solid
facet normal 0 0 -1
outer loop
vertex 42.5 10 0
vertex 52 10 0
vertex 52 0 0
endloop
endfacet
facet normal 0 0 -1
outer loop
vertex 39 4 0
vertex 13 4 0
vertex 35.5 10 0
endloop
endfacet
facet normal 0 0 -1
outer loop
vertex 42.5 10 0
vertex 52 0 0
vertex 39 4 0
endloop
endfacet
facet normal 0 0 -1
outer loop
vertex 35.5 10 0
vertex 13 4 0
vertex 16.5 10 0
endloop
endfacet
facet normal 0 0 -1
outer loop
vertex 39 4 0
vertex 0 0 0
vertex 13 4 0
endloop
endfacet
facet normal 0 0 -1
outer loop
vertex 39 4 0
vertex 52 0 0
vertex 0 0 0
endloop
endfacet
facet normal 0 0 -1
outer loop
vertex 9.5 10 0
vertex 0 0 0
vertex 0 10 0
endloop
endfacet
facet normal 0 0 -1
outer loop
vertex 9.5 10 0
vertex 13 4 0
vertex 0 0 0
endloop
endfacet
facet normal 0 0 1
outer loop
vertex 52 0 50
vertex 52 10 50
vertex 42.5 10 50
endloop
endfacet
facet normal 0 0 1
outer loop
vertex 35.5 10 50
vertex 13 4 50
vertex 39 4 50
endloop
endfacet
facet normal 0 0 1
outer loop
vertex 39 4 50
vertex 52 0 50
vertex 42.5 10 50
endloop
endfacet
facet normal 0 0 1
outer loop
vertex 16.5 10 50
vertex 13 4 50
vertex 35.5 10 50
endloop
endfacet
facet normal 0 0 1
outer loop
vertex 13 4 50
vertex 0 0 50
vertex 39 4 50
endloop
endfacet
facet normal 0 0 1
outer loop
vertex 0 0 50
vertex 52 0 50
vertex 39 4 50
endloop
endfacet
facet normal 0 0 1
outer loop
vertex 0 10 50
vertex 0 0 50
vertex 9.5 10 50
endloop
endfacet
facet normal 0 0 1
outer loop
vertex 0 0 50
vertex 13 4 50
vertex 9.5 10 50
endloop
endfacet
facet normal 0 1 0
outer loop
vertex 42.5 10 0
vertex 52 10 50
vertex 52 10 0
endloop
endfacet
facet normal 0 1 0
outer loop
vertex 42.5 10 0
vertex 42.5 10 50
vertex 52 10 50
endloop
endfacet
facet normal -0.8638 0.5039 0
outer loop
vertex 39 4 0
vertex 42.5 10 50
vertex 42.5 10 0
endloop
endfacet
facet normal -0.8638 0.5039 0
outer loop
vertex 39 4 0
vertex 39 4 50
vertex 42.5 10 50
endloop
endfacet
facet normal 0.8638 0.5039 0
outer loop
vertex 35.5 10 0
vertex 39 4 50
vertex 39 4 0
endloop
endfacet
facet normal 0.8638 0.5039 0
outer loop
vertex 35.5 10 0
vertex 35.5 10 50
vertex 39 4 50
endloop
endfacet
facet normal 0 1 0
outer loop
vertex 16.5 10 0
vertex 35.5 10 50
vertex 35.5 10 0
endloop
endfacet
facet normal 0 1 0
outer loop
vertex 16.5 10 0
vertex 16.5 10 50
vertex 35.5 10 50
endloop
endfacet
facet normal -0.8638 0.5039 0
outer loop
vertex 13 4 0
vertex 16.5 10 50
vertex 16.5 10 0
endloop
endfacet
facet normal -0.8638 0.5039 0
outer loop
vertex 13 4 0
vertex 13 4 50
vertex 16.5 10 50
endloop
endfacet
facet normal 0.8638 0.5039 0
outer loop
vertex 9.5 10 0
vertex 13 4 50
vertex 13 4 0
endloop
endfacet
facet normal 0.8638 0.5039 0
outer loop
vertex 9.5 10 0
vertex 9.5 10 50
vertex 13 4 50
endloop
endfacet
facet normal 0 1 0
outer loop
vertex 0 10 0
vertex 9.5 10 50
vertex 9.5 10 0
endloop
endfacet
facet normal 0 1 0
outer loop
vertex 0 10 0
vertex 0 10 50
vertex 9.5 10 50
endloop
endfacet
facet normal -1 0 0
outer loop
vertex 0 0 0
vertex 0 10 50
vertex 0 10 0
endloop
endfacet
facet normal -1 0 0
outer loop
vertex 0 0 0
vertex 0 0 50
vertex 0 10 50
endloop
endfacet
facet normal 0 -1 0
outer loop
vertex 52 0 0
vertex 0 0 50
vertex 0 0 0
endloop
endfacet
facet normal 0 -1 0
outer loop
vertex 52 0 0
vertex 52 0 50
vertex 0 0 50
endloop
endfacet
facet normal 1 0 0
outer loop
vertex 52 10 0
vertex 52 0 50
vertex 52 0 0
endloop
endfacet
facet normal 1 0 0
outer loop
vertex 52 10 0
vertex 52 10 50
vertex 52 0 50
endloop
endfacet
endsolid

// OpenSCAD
$fn = 32;

// ----------------------------------------------------------------------
// V guide rail: doublev, 52 mm wide
// ----------------------------------------------------------------------

// --- parameters (mm) ---
rail_w = 52;              // rail width, X
base_t = 10;              // base plate thickness
v_depth = 6;              // V feature depth / height
v_half_w = 7;             // half width of the V at the base face
plate_t = 50;             // rail length, Z (the extrusion height)
groove_off = 13;          // offset of each groove from the centreline
fit_tol = 0.05;           // declared fit tolerance (prompt contract)
free_tol = 0.2;           // declared free tolerance (prompt contract)

centre_x = rail_w / 2;  // rail centreline
groove_a = centre_x - groove_off;  // axis of the first groove
groove_b = centre_x + groove_off;  // axis of the second groove

profile = [[0, 0], [52, 0], [52, 10], [42.5, 10], [39, 4], [35.5, 10], [16.5, 10], [13, 4], [9.5, 10], [0, 10]];  // primary outline, 10 points, counter clockwise

// --- the one profile operation ---
linear_extrude(height = plate_t) polygon(points = profile);
